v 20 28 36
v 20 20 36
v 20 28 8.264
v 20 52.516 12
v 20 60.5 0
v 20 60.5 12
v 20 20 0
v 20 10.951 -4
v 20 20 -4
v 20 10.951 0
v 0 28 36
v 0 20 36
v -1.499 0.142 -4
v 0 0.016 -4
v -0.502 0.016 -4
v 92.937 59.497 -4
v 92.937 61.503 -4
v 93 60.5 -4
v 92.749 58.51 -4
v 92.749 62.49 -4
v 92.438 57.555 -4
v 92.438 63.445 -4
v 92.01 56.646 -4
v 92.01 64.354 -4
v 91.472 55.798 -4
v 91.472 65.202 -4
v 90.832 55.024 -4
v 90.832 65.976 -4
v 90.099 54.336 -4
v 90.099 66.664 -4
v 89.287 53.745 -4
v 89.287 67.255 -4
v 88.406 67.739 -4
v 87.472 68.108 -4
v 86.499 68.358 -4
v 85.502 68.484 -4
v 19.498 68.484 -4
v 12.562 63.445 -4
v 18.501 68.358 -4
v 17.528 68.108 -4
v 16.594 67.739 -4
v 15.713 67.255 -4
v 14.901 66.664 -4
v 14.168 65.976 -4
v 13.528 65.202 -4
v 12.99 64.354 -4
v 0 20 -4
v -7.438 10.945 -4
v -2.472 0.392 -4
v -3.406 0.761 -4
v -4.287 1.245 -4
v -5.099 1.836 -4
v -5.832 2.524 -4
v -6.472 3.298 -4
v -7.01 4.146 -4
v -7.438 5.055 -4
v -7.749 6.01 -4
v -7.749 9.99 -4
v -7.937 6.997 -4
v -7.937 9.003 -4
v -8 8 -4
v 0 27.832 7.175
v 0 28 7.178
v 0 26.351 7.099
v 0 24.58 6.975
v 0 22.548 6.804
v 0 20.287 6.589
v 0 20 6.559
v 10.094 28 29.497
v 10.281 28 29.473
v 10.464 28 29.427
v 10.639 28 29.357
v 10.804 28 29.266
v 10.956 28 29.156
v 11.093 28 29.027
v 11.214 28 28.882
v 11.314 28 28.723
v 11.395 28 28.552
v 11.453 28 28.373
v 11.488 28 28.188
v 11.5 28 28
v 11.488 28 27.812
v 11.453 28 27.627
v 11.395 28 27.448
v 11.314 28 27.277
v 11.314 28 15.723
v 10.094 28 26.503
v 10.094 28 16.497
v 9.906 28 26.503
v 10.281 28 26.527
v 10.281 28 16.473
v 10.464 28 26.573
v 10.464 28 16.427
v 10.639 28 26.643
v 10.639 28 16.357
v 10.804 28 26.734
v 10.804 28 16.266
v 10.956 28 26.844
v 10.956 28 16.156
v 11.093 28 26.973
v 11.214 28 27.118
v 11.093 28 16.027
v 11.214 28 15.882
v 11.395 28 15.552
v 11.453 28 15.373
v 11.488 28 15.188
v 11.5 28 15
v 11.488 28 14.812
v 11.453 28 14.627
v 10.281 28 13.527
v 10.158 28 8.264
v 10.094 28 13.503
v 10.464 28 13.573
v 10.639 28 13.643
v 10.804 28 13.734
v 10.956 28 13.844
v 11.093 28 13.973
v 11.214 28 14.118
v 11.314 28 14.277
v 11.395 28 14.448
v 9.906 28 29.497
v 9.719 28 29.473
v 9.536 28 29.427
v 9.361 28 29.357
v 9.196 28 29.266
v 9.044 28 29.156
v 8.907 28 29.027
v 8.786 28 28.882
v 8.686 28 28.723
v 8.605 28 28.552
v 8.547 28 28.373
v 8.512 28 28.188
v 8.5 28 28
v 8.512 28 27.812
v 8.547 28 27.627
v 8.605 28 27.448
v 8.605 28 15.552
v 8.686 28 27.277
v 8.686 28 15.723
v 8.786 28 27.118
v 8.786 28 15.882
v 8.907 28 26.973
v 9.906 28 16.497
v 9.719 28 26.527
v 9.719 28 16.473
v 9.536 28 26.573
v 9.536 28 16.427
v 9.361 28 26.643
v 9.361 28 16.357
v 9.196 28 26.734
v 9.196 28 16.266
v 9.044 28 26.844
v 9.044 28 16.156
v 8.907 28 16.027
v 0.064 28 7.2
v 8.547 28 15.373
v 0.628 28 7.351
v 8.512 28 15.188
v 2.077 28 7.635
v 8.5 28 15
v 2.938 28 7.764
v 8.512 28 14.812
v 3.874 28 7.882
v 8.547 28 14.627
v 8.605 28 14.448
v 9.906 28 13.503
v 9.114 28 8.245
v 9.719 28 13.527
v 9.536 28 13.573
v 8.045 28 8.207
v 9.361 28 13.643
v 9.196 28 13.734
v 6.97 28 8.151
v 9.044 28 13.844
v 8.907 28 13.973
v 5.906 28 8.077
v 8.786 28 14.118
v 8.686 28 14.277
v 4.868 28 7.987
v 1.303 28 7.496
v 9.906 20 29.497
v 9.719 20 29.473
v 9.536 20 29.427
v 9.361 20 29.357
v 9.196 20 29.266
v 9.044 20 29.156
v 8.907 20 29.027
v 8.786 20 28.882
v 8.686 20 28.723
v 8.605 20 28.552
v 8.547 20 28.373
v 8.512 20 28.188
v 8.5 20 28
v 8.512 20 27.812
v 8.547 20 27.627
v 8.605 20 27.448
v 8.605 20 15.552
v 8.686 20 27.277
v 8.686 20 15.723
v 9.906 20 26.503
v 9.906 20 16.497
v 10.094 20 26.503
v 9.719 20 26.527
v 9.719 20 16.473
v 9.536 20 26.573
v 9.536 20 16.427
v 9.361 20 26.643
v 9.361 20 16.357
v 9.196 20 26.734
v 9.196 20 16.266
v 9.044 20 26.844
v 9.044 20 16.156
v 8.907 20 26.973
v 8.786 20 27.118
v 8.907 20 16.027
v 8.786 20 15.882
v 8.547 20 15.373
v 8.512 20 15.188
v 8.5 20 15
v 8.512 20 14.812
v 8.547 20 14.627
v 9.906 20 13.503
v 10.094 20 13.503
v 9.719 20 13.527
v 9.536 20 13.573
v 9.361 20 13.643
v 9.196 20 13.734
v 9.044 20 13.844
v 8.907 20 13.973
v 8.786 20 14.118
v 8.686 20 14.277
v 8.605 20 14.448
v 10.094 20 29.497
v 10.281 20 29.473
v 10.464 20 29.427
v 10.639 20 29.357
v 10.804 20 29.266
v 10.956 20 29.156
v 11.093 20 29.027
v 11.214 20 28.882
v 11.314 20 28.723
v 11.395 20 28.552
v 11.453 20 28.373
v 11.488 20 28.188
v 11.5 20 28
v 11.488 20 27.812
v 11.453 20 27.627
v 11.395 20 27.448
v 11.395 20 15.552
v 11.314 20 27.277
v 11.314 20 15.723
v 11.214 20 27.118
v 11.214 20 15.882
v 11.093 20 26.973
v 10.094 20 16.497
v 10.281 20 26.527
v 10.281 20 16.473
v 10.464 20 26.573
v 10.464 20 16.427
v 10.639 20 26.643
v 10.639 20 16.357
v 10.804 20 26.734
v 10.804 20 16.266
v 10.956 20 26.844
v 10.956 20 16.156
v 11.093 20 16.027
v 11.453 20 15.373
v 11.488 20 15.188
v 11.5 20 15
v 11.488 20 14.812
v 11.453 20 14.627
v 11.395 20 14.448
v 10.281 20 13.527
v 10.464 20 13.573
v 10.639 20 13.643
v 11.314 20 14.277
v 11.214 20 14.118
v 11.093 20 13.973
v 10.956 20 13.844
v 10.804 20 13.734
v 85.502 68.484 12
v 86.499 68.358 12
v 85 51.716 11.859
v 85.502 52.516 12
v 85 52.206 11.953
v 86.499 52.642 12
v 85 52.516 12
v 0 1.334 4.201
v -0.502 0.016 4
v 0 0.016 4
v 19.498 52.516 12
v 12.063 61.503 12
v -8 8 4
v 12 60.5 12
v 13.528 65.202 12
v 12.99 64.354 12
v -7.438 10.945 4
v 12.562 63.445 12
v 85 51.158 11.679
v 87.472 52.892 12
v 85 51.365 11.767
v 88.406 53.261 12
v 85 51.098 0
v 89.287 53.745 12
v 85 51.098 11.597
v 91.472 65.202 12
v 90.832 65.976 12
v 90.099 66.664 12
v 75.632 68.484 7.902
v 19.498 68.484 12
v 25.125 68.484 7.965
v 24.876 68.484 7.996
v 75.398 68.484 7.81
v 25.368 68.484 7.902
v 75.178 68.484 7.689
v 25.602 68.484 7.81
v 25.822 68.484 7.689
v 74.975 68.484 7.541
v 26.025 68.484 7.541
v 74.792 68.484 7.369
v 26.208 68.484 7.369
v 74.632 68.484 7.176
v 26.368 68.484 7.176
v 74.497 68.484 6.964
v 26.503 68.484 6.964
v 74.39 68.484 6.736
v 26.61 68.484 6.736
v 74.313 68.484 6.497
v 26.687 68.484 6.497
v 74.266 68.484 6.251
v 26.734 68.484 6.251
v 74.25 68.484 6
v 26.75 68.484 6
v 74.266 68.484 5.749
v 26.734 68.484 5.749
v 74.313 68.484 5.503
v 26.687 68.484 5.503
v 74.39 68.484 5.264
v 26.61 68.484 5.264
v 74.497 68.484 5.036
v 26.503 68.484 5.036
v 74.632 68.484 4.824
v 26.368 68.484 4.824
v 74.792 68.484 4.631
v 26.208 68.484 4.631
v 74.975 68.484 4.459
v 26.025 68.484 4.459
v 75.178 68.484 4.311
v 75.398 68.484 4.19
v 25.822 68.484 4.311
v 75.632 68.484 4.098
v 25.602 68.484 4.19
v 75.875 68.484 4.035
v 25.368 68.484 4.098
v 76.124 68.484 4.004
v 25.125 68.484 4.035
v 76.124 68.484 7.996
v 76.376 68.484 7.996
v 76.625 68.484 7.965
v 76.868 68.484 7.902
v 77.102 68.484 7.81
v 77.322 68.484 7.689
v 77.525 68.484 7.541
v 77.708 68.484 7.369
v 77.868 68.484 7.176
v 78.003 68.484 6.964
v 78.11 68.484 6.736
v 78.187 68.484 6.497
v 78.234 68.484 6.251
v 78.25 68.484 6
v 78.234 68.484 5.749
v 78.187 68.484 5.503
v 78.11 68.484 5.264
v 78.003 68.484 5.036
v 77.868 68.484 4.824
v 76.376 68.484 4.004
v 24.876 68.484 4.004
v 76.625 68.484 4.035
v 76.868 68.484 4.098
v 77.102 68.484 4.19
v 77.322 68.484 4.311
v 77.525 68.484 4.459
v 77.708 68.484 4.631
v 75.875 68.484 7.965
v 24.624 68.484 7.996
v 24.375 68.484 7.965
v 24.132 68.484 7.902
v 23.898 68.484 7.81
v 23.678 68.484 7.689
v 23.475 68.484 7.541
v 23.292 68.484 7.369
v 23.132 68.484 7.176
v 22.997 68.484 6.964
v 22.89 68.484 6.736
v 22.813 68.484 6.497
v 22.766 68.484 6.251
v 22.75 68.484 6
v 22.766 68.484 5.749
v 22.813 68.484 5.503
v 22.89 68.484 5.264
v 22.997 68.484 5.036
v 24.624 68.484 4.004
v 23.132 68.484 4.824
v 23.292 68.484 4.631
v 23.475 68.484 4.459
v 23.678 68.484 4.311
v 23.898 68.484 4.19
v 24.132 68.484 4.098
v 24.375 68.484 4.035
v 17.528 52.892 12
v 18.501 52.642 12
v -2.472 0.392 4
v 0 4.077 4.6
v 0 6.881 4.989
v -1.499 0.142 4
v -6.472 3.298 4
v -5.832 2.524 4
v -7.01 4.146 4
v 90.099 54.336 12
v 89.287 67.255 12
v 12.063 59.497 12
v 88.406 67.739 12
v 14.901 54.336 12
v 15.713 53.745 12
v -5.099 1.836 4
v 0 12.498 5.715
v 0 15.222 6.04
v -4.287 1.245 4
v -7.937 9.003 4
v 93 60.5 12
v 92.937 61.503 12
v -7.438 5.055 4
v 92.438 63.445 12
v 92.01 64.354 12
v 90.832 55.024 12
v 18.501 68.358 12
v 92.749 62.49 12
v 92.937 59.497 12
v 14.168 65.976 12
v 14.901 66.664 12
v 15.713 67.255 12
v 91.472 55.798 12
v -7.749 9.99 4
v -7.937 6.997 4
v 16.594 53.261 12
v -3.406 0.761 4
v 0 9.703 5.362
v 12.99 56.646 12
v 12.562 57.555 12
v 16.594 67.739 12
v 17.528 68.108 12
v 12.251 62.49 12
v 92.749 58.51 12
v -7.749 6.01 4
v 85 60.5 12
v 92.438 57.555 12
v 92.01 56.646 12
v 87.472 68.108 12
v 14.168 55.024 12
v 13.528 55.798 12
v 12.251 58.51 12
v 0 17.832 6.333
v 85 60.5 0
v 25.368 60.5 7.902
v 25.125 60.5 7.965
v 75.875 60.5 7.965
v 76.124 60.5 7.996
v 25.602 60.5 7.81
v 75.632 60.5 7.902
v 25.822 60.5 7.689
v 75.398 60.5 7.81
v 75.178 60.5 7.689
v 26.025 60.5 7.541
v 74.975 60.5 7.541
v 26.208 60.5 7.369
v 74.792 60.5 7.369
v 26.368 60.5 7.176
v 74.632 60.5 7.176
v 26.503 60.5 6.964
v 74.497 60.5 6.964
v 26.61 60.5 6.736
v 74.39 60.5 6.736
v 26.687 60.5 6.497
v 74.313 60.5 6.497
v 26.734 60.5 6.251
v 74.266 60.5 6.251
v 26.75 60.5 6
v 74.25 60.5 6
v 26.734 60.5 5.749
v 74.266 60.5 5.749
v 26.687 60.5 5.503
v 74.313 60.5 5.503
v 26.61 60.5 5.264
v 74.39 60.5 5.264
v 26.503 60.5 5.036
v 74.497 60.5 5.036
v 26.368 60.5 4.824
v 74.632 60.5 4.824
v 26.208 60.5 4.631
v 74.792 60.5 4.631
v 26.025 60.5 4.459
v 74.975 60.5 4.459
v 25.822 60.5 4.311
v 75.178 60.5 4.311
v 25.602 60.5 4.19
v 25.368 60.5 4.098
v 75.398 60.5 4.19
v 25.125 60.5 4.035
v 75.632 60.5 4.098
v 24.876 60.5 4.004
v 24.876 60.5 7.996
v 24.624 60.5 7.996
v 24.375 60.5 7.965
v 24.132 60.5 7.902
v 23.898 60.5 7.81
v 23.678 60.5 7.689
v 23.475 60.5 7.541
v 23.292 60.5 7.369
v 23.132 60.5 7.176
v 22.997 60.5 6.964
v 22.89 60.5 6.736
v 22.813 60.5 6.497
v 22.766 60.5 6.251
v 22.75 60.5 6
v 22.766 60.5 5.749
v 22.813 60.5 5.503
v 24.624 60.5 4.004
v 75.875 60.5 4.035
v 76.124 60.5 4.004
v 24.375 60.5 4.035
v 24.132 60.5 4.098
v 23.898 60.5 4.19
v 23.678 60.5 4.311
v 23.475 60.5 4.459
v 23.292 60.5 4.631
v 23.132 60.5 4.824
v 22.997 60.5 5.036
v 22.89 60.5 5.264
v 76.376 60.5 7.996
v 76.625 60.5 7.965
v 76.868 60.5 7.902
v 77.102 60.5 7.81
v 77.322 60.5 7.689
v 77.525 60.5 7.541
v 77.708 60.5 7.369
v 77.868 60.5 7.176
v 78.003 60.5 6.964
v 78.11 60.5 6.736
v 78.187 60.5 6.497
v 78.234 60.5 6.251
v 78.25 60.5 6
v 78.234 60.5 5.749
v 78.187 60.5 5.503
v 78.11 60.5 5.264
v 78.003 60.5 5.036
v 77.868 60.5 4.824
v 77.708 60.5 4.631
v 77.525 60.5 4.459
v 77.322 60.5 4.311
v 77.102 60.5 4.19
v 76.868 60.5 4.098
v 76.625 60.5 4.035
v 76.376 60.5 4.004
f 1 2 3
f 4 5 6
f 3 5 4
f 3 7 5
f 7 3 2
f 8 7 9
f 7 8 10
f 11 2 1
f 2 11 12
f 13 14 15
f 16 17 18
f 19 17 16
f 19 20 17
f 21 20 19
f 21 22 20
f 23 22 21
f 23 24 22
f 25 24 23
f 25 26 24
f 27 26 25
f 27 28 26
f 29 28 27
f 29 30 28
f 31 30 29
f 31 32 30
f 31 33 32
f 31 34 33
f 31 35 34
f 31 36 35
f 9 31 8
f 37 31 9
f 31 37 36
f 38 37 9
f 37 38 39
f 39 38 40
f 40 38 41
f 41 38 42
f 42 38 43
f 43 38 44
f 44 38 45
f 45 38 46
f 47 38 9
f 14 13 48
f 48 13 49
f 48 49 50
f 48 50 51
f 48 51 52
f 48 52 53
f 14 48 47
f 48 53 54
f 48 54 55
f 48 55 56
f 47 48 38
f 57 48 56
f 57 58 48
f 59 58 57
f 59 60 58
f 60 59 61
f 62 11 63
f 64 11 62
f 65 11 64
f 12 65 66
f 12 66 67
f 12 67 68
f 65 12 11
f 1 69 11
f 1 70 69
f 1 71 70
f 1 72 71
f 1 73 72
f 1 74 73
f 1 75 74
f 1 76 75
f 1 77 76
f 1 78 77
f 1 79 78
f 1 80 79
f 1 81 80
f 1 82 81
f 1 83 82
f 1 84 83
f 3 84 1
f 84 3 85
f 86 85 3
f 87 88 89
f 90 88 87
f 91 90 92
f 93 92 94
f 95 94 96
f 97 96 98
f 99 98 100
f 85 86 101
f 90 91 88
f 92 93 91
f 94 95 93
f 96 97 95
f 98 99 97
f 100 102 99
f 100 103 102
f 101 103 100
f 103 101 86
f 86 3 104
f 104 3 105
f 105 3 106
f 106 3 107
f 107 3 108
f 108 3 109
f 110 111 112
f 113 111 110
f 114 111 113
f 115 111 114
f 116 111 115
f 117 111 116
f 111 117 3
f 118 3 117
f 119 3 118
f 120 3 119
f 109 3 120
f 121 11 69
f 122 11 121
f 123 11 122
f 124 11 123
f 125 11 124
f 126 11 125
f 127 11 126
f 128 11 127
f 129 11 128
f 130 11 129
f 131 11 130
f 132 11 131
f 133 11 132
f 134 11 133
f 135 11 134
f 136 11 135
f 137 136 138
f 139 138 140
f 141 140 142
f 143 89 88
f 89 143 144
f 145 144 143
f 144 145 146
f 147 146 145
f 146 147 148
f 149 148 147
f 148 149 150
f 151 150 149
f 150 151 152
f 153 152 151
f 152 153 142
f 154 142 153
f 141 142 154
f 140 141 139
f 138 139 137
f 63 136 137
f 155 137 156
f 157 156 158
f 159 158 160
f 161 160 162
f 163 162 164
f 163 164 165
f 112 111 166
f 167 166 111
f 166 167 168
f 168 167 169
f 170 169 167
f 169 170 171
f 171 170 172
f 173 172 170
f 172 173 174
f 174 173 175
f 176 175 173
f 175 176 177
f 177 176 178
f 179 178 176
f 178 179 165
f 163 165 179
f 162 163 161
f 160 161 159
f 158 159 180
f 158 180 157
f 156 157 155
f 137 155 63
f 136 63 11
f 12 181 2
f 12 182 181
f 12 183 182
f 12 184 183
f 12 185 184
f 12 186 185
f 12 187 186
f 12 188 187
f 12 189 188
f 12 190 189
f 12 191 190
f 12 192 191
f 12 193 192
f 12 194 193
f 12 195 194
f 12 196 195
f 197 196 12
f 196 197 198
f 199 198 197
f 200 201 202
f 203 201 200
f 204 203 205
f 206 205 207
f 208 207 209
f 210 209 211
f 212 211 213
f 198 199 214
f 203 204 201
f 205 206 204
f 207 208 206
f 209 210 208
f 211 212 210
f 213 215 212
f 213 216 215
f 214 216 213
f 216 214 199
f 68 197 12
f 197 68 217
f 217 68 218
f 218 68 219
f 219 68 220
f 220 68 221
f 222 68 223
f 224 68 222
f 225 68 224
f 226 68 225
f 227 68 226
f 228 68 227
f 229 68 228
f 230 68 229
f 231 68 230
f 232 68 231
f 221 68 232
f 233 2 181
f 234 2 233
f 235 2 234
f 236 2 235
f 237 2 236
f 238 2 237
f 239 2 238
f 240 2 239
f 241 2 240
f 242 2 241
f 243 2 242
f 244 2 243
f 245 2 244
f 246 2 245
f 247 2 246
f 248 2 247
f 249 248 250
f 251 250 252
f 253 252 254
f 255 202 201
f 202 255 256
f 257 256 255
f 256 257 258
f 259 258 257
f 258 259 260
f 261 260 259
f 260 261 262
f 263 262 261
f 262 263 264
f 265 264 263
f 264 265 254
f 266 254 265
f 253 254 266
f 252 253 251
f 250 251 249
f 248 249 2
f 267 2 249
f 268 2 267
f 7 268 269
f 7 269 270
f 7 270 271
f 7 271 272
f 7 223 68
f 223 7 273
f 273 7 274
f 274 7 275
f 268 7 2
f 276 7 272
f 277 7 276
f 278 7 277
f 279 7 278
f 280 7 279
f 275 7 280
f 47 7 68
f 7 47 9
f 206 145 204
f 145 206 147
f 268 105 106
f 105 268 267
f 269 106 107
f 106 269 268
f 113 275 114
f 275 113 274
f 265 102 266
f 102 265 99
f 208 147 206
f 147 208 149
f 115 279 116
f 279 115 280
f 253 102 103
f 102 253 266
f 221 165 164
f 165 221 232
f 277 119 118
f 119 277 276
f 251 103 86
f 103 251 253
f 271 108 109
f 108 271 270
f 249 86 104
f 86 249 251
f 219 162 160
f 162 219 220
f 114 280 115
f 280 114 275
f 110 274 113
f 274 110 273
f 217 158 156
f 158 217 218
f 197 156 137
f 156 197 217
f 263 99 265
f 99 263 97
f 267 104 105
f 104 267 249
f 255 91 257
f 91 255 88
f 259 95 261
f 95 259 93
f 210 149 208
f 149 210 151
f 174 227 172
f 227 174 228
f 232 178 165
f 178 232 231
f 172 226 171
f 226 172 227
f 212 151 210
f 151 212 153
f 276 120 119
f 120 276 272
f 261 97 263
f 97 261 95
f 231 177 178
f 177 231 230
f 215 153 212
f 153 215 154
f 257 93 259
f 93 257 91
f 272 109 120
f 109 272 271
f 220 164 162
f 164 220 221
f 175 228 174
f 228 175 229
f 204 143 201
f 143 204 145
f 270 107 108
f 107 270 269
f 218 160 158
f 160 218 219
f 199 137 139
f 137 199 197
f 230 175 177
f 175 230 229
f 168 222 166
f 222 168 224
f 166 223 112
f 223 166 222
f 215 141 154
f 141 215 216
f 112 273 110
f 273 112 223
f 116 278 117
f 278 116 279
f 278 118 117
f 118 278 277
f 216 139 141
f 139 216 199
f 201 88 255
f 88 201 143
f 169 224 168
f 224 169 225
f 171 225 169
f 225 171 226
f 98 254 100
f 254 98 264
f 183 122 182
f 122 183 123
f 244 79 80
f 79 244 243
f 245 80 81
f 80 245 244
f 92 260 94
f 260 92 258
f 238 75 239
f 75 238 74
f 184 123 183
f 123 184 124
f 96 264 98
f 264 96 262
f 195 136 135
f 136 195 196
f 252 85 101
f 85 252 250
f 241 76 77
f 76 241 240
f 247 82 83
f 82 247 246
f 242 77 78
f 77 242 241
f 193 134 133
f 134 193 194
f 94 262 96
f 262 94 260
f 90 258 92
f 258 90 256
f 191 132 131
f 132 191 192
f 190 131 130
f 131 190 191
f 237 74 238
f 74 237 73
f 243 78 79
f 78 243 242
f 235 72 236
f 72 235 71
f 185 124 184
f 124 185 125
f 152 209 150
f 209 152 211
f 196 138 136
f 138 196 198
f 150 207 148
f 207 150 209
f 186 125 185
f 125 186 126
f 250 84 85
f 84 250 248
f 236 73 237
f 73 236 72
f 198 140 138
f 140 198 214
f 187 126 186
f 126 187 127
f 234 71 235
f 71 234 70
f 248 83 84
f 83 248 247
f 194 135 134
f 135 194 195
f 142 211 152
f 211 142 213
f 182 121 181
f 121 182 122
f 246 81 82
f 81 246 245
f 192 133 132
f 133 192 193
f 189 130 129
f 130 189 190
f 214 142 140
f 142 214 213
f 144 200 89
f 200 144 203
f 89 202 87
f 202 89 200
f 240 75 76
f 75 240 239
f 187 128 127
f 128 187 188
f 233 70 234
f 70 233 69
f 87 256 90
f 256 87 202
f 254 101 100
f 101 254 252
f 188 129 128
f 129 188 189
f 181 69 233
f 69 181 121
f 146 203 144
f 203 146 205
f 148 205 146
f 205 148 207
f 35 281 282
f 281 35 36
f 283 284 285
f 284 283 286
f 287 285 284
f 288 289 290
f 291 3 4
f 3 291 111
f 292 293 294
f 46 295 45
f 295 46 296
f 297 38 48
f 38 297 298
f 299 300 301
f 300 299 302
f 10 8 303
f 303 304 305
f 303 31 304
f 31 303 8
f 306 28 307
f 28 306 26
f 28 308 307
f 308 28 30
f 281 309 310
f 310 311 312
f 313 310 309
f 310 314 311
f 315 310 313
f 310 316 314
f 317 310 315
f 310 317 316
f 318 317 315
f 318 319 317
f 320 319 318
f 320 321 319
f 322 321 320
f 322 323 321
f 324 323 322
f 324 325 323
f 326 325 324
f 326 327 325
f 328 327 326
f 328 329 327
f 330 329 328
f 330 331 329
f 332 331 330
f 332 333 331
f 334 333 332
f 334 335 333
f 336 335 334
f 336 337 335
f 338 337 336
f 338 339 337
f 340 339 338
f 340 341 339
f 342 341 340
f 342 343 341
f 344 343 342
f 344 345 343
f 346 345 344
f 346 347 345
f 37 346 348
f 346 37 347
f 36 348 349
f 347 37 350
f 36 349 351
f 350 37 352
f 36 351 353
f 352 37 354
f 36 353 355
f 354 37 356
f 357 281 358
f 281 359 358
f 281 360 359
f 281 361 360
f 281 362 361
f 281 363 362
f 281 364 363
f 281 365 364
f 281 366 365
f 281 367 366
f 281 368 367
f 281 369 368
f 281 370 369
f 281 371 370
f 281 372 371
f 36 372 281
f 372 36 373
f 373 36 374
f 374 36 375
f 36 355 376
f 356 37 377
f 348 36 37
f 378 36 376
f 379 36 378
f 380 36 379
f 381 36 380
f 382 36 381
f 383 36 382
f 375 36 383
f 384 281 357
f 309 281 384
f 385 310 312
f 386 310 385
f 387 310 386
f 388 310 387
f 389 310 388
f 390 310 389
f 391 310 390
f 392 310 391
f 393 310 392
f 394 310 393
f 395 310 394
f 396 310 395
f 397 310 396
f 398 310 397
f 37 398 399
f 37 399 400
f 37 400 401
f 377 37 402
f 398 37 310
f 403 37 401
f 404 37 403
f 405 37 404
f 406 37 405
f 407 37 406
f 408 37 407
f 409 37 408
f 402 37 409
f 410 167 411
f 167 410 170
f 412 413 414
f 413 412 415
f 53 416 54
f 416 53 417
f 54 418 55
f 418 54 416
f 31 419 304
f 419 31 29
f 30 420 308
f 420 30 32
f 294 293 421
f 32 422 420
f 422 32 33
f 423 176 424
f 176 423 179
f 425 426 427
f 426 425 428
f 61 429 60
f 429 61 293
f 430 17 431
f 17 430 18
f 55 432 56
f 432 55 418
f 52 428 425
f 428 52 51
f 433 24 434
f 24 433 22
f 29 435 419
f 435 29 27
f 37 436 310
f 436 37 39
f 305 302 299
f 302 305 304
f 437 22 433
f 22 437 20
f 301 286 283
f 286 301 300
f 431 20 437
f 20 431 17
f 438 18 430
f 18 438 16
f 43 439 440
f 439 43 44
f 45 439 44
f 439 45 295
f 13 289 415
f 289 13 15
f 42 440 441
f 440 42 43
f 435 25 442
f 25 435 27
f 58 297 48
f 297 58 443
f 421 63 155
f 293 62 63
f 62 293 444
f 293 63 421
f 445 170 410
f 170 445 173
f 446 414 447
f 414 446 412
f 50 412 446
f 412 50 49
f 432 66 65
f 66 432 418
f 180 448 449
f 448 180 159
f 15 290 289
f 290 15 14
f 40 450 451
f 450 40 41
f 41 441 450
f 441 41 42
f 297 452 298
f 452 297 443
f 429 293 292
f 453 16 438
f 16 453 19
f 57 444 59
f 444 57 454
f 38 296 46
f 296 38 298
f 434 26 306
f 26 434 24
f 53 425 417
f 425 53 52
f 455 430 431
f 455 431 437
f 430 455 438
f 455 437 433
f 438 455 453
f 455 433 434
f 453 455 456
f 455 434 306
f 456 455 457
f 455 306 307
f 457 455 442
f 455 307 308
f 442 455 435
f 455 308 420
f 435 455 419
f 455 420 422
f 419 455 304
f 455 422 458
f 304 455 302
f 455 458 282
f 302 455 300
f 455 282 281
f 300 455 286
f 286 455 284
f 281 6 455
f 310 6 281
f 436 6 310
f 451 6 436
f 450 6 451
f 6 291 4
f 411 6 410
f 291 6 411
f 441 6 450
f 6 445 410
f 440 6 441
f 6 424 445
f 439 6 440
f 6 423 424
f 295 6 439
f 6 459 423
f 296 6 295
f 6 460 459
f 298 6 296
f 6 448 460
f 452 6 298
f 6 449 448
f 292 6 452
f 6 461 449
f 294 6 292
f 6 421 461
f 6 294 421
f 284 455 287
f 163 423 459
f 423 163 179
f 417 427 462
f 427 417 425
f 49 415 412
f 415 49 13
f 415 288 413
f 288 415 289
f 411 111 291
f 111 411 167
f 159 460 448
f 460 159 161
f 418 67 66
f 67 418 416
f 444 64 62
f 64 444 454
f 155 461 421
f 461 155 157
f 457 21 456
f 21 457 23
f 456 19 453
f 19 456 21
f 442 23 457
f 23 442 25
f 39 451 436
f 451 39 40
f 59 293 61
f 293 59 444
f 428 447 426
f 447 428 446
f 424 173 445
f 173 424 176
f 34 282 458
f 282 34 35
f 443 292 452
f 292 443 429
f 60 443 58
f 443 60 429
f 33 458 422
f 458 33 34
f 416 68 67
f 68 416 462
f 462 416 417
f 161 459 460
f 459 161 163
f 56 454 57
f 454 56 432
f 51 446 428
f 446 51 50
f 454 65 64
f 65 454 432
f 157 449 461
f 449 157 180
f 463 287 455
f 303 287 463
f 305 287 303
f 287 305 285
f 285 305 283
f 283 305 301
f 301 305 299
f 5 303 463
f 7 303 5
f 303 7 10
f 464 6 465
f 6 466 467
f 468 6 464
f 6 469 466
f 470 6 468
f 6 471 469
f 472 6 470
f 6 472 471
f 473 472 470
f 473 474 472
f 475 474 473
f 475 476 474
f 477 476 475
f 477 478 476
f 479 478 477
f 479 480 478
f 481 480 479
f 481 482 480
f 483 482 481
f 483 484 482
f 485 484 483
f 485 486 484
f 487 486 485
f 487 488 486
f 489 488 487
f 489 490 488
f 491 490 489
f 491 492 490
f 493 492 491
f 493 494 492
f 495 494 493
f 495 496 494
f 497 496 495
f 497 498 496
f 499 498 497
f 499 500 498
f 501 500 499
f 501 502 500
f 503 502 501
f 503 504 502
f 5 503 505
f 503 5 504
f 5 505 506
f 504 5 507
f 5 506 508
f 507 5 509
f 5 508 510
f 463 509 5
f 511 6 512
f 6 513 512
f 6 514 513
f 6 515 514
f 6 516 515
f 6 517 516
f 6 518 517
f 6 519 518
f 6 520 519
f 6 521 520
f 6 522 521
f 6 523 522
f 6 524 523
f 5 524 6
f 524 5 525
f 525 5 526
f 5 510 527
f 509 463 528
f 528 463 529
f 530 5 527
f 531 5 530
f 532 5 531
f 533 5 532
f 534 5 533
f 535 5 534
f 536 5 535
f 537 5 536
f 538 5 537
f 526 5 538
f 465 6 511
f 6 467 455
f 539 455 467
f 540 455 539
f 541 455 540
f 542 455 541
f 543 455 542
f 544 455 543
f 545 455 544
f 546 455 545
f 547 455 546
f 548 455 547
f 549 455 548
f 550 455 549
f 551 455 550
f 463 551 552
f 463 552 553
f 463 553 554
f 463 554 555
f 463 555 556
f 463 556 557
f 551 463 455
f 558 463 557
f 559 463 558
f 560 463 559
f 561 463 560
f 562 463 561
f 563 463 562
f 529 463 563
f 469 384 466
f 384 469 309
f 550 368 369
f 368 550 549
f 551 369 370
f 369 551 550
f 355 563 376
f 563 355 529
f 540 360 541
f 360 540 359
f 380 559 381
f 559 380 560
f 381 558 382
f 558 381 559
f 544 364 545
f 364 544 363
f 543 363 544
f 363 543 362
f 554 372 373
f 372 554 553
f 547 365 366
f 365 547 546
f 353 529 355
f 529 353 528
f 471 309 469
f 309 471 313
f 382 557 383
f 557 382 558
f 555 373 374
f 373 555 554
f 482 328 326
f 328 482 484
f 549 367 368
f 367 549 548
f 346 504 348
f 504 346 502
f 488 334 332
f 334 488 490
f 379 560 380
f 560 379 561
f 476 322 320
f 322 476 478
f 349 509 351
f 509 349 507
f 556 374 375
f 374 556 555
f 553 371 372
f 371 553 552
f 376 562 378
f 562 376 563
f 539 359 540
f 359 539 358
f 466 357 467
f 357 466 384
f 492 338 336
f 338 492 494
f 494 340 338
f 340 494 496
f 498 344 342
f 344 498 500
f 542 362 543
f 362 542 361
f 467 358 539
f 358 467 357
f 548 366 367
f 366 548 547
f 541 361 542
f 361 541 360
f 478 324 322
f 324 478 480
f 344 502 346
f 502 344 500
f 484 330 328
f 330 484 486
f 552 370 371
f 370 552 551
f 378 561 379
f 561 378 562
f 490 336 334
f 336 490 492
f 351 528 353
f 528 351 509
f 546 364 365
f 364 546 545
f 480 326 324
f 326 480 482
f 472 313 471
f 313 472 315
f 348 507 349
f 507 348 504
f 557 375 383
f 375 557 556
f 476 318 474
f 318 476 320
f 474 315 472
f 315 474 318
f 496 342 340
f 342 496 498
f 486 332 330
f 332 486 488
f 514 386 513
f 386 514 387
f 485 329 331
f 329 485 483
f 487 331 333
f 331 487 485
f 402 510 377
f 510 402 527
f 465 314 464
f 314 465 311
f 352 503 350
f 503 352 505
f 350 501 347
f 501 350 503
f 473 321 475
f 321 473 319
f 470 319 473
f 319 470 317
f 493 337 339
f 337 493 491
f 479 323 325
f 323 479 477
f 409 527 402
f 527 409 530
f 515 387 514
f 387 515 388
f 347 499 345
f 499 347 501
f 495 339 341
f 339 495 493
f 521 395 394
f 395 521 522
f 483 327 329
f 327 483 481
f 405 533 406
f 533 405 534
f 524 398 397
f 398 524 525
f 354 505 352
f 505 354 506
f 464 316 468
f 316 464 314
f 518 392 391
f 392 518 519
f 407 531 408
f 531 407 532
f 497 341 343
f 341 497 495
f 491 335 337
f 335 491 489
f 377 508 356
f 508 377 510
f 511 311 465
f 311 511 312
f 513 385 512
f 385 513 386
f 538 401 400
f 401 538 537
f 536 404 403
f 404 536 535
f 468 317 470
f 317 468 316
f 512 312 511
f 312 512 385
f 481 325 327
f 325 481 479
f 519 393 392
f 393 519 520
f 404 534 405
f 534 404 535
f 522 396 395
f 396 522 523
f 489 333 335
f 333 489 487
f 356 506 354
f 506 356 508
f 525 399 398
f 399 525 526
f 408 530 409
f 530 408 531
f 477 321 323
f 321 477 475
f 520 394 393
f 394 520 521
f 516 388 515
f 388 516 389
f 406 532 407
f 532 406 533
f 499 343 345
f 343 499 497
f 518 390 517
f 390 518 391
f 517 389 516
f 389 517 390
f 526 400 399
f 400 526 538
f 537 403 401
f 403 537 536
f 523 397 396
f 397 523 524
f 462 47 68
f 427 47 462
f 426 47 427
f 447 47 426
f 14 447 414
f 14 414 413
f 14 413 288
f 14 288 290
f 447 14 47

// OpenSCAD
// file: configuration.scad
// Increase this if your slicer or printer make holes too tight.
extra_radius = 0; // 0.1;

// OD = outside diameter, corner to corner.
m3_nut_od = 6.1;
m3_nut_radius = m3_nut_od/2 + 0.2 + extra_radius;
m3_nut_h = 2.4;
m3_nyloc_h = 3.9;
m3_washer_radius = 3.5 + extra_radius;

m4_nut_od = 7.8;
m4_nut_radius = m4_nut_od/2 + 0.2 + extra_radius;
m4_washer_radius = 4.4 + extra_radius;

// Major diameter of metric 3mm thread.
m3_major = 3;
m3_radius = m3_major/2 + extra_radius;
m3_wide_radius = m3_major/2 + extra_radius + 0.2;

// Major diameter of metric 4mm thread.
m4_major = 4;
m4_radius = m4_major/2 + extra_radius;
m4_wide_radius = m4_major/2 + extra_radius + 0.2;

// M6 Radius
m6_radius = 6/2;

// No4 Self Tapper pilot hole radius
no4_pilot_radius = 2.35/2;

// NEMA17 stepper motors.
motor_shaft_diameter = 5;
motor_shaft_radius = motor_shaft_diameter/2 + extra_radius;

// Frame brackets. M3x8mm screws work best with 3.6 mm brackets.
thickness = 4.0; //3.6 on 1515

// OpenBeam or Misumi. Currently only 15x15 mm, but there is a plan
// to make models more parametric and allow 20x20 mm in the future.
extrusion = 20;

// Placement for the NEMA17 stepper motors.
motor_offset = 44;
motor_length = 47;

separation = 38;  // Distance between ball joint mounting faces.

extrusion_fin_d = 1;

vertex_radius = 40.5; //set to 36 for 1515
vertex_x_offset = 7.25; // offset of the horizontal extrusion to the vertical one in X axis
vertex_y_offset = 39 ;//27; // offset of the horizontal extrusion to the vertical one in Y axis
// main file
include <configuration.scad>;

height=16;
$fn=50;

module psu()
{
    cube([65,100.5,125.5]);
    translate([65/2-2 + 51.5/2,110.5,6])
    rotate([90,0,0])
        cylinder(h=10,r=2);
    translate([65/2-2 - 51.5/2,110.5,6])
    rotate([90,0,0])
        cylinder(h=10,r=2);
    //51.5, m4
    //6mm
}

module extrusion()
{
    cube([extrusion,extrusion,200]);
}

module mount()
{
    hull()
    {
        translate([0,8,0])
            cylinder(h=8,r=8);
        translate([65+extrusion,100.5-40,0])
            cylinder(h=height,r=8);
        translate([extrusion,100.5-40,0])
            cylinder(h=height,r=8);    
    }
    translate([0,extrusion,0])
    {
        difference()
        {
            cube([extrusion,8,40]);
            translate([extrusion/2,extrusion,19])
                rotate([90,0,0])
                    cylinder(h=50,r=1.5);
            translate([extrusion/2,extrusion,32])
                rotate([90,0,0])
                    cylinder(h=50,r=1.5);
        }
    }
    
}

//psu();
difference()
{
    translate([0,0,-4])
        mount();
    translate([extrusion,-40,0])
        #psu();
    translate([0,0,-30])
        extrusion();
}
